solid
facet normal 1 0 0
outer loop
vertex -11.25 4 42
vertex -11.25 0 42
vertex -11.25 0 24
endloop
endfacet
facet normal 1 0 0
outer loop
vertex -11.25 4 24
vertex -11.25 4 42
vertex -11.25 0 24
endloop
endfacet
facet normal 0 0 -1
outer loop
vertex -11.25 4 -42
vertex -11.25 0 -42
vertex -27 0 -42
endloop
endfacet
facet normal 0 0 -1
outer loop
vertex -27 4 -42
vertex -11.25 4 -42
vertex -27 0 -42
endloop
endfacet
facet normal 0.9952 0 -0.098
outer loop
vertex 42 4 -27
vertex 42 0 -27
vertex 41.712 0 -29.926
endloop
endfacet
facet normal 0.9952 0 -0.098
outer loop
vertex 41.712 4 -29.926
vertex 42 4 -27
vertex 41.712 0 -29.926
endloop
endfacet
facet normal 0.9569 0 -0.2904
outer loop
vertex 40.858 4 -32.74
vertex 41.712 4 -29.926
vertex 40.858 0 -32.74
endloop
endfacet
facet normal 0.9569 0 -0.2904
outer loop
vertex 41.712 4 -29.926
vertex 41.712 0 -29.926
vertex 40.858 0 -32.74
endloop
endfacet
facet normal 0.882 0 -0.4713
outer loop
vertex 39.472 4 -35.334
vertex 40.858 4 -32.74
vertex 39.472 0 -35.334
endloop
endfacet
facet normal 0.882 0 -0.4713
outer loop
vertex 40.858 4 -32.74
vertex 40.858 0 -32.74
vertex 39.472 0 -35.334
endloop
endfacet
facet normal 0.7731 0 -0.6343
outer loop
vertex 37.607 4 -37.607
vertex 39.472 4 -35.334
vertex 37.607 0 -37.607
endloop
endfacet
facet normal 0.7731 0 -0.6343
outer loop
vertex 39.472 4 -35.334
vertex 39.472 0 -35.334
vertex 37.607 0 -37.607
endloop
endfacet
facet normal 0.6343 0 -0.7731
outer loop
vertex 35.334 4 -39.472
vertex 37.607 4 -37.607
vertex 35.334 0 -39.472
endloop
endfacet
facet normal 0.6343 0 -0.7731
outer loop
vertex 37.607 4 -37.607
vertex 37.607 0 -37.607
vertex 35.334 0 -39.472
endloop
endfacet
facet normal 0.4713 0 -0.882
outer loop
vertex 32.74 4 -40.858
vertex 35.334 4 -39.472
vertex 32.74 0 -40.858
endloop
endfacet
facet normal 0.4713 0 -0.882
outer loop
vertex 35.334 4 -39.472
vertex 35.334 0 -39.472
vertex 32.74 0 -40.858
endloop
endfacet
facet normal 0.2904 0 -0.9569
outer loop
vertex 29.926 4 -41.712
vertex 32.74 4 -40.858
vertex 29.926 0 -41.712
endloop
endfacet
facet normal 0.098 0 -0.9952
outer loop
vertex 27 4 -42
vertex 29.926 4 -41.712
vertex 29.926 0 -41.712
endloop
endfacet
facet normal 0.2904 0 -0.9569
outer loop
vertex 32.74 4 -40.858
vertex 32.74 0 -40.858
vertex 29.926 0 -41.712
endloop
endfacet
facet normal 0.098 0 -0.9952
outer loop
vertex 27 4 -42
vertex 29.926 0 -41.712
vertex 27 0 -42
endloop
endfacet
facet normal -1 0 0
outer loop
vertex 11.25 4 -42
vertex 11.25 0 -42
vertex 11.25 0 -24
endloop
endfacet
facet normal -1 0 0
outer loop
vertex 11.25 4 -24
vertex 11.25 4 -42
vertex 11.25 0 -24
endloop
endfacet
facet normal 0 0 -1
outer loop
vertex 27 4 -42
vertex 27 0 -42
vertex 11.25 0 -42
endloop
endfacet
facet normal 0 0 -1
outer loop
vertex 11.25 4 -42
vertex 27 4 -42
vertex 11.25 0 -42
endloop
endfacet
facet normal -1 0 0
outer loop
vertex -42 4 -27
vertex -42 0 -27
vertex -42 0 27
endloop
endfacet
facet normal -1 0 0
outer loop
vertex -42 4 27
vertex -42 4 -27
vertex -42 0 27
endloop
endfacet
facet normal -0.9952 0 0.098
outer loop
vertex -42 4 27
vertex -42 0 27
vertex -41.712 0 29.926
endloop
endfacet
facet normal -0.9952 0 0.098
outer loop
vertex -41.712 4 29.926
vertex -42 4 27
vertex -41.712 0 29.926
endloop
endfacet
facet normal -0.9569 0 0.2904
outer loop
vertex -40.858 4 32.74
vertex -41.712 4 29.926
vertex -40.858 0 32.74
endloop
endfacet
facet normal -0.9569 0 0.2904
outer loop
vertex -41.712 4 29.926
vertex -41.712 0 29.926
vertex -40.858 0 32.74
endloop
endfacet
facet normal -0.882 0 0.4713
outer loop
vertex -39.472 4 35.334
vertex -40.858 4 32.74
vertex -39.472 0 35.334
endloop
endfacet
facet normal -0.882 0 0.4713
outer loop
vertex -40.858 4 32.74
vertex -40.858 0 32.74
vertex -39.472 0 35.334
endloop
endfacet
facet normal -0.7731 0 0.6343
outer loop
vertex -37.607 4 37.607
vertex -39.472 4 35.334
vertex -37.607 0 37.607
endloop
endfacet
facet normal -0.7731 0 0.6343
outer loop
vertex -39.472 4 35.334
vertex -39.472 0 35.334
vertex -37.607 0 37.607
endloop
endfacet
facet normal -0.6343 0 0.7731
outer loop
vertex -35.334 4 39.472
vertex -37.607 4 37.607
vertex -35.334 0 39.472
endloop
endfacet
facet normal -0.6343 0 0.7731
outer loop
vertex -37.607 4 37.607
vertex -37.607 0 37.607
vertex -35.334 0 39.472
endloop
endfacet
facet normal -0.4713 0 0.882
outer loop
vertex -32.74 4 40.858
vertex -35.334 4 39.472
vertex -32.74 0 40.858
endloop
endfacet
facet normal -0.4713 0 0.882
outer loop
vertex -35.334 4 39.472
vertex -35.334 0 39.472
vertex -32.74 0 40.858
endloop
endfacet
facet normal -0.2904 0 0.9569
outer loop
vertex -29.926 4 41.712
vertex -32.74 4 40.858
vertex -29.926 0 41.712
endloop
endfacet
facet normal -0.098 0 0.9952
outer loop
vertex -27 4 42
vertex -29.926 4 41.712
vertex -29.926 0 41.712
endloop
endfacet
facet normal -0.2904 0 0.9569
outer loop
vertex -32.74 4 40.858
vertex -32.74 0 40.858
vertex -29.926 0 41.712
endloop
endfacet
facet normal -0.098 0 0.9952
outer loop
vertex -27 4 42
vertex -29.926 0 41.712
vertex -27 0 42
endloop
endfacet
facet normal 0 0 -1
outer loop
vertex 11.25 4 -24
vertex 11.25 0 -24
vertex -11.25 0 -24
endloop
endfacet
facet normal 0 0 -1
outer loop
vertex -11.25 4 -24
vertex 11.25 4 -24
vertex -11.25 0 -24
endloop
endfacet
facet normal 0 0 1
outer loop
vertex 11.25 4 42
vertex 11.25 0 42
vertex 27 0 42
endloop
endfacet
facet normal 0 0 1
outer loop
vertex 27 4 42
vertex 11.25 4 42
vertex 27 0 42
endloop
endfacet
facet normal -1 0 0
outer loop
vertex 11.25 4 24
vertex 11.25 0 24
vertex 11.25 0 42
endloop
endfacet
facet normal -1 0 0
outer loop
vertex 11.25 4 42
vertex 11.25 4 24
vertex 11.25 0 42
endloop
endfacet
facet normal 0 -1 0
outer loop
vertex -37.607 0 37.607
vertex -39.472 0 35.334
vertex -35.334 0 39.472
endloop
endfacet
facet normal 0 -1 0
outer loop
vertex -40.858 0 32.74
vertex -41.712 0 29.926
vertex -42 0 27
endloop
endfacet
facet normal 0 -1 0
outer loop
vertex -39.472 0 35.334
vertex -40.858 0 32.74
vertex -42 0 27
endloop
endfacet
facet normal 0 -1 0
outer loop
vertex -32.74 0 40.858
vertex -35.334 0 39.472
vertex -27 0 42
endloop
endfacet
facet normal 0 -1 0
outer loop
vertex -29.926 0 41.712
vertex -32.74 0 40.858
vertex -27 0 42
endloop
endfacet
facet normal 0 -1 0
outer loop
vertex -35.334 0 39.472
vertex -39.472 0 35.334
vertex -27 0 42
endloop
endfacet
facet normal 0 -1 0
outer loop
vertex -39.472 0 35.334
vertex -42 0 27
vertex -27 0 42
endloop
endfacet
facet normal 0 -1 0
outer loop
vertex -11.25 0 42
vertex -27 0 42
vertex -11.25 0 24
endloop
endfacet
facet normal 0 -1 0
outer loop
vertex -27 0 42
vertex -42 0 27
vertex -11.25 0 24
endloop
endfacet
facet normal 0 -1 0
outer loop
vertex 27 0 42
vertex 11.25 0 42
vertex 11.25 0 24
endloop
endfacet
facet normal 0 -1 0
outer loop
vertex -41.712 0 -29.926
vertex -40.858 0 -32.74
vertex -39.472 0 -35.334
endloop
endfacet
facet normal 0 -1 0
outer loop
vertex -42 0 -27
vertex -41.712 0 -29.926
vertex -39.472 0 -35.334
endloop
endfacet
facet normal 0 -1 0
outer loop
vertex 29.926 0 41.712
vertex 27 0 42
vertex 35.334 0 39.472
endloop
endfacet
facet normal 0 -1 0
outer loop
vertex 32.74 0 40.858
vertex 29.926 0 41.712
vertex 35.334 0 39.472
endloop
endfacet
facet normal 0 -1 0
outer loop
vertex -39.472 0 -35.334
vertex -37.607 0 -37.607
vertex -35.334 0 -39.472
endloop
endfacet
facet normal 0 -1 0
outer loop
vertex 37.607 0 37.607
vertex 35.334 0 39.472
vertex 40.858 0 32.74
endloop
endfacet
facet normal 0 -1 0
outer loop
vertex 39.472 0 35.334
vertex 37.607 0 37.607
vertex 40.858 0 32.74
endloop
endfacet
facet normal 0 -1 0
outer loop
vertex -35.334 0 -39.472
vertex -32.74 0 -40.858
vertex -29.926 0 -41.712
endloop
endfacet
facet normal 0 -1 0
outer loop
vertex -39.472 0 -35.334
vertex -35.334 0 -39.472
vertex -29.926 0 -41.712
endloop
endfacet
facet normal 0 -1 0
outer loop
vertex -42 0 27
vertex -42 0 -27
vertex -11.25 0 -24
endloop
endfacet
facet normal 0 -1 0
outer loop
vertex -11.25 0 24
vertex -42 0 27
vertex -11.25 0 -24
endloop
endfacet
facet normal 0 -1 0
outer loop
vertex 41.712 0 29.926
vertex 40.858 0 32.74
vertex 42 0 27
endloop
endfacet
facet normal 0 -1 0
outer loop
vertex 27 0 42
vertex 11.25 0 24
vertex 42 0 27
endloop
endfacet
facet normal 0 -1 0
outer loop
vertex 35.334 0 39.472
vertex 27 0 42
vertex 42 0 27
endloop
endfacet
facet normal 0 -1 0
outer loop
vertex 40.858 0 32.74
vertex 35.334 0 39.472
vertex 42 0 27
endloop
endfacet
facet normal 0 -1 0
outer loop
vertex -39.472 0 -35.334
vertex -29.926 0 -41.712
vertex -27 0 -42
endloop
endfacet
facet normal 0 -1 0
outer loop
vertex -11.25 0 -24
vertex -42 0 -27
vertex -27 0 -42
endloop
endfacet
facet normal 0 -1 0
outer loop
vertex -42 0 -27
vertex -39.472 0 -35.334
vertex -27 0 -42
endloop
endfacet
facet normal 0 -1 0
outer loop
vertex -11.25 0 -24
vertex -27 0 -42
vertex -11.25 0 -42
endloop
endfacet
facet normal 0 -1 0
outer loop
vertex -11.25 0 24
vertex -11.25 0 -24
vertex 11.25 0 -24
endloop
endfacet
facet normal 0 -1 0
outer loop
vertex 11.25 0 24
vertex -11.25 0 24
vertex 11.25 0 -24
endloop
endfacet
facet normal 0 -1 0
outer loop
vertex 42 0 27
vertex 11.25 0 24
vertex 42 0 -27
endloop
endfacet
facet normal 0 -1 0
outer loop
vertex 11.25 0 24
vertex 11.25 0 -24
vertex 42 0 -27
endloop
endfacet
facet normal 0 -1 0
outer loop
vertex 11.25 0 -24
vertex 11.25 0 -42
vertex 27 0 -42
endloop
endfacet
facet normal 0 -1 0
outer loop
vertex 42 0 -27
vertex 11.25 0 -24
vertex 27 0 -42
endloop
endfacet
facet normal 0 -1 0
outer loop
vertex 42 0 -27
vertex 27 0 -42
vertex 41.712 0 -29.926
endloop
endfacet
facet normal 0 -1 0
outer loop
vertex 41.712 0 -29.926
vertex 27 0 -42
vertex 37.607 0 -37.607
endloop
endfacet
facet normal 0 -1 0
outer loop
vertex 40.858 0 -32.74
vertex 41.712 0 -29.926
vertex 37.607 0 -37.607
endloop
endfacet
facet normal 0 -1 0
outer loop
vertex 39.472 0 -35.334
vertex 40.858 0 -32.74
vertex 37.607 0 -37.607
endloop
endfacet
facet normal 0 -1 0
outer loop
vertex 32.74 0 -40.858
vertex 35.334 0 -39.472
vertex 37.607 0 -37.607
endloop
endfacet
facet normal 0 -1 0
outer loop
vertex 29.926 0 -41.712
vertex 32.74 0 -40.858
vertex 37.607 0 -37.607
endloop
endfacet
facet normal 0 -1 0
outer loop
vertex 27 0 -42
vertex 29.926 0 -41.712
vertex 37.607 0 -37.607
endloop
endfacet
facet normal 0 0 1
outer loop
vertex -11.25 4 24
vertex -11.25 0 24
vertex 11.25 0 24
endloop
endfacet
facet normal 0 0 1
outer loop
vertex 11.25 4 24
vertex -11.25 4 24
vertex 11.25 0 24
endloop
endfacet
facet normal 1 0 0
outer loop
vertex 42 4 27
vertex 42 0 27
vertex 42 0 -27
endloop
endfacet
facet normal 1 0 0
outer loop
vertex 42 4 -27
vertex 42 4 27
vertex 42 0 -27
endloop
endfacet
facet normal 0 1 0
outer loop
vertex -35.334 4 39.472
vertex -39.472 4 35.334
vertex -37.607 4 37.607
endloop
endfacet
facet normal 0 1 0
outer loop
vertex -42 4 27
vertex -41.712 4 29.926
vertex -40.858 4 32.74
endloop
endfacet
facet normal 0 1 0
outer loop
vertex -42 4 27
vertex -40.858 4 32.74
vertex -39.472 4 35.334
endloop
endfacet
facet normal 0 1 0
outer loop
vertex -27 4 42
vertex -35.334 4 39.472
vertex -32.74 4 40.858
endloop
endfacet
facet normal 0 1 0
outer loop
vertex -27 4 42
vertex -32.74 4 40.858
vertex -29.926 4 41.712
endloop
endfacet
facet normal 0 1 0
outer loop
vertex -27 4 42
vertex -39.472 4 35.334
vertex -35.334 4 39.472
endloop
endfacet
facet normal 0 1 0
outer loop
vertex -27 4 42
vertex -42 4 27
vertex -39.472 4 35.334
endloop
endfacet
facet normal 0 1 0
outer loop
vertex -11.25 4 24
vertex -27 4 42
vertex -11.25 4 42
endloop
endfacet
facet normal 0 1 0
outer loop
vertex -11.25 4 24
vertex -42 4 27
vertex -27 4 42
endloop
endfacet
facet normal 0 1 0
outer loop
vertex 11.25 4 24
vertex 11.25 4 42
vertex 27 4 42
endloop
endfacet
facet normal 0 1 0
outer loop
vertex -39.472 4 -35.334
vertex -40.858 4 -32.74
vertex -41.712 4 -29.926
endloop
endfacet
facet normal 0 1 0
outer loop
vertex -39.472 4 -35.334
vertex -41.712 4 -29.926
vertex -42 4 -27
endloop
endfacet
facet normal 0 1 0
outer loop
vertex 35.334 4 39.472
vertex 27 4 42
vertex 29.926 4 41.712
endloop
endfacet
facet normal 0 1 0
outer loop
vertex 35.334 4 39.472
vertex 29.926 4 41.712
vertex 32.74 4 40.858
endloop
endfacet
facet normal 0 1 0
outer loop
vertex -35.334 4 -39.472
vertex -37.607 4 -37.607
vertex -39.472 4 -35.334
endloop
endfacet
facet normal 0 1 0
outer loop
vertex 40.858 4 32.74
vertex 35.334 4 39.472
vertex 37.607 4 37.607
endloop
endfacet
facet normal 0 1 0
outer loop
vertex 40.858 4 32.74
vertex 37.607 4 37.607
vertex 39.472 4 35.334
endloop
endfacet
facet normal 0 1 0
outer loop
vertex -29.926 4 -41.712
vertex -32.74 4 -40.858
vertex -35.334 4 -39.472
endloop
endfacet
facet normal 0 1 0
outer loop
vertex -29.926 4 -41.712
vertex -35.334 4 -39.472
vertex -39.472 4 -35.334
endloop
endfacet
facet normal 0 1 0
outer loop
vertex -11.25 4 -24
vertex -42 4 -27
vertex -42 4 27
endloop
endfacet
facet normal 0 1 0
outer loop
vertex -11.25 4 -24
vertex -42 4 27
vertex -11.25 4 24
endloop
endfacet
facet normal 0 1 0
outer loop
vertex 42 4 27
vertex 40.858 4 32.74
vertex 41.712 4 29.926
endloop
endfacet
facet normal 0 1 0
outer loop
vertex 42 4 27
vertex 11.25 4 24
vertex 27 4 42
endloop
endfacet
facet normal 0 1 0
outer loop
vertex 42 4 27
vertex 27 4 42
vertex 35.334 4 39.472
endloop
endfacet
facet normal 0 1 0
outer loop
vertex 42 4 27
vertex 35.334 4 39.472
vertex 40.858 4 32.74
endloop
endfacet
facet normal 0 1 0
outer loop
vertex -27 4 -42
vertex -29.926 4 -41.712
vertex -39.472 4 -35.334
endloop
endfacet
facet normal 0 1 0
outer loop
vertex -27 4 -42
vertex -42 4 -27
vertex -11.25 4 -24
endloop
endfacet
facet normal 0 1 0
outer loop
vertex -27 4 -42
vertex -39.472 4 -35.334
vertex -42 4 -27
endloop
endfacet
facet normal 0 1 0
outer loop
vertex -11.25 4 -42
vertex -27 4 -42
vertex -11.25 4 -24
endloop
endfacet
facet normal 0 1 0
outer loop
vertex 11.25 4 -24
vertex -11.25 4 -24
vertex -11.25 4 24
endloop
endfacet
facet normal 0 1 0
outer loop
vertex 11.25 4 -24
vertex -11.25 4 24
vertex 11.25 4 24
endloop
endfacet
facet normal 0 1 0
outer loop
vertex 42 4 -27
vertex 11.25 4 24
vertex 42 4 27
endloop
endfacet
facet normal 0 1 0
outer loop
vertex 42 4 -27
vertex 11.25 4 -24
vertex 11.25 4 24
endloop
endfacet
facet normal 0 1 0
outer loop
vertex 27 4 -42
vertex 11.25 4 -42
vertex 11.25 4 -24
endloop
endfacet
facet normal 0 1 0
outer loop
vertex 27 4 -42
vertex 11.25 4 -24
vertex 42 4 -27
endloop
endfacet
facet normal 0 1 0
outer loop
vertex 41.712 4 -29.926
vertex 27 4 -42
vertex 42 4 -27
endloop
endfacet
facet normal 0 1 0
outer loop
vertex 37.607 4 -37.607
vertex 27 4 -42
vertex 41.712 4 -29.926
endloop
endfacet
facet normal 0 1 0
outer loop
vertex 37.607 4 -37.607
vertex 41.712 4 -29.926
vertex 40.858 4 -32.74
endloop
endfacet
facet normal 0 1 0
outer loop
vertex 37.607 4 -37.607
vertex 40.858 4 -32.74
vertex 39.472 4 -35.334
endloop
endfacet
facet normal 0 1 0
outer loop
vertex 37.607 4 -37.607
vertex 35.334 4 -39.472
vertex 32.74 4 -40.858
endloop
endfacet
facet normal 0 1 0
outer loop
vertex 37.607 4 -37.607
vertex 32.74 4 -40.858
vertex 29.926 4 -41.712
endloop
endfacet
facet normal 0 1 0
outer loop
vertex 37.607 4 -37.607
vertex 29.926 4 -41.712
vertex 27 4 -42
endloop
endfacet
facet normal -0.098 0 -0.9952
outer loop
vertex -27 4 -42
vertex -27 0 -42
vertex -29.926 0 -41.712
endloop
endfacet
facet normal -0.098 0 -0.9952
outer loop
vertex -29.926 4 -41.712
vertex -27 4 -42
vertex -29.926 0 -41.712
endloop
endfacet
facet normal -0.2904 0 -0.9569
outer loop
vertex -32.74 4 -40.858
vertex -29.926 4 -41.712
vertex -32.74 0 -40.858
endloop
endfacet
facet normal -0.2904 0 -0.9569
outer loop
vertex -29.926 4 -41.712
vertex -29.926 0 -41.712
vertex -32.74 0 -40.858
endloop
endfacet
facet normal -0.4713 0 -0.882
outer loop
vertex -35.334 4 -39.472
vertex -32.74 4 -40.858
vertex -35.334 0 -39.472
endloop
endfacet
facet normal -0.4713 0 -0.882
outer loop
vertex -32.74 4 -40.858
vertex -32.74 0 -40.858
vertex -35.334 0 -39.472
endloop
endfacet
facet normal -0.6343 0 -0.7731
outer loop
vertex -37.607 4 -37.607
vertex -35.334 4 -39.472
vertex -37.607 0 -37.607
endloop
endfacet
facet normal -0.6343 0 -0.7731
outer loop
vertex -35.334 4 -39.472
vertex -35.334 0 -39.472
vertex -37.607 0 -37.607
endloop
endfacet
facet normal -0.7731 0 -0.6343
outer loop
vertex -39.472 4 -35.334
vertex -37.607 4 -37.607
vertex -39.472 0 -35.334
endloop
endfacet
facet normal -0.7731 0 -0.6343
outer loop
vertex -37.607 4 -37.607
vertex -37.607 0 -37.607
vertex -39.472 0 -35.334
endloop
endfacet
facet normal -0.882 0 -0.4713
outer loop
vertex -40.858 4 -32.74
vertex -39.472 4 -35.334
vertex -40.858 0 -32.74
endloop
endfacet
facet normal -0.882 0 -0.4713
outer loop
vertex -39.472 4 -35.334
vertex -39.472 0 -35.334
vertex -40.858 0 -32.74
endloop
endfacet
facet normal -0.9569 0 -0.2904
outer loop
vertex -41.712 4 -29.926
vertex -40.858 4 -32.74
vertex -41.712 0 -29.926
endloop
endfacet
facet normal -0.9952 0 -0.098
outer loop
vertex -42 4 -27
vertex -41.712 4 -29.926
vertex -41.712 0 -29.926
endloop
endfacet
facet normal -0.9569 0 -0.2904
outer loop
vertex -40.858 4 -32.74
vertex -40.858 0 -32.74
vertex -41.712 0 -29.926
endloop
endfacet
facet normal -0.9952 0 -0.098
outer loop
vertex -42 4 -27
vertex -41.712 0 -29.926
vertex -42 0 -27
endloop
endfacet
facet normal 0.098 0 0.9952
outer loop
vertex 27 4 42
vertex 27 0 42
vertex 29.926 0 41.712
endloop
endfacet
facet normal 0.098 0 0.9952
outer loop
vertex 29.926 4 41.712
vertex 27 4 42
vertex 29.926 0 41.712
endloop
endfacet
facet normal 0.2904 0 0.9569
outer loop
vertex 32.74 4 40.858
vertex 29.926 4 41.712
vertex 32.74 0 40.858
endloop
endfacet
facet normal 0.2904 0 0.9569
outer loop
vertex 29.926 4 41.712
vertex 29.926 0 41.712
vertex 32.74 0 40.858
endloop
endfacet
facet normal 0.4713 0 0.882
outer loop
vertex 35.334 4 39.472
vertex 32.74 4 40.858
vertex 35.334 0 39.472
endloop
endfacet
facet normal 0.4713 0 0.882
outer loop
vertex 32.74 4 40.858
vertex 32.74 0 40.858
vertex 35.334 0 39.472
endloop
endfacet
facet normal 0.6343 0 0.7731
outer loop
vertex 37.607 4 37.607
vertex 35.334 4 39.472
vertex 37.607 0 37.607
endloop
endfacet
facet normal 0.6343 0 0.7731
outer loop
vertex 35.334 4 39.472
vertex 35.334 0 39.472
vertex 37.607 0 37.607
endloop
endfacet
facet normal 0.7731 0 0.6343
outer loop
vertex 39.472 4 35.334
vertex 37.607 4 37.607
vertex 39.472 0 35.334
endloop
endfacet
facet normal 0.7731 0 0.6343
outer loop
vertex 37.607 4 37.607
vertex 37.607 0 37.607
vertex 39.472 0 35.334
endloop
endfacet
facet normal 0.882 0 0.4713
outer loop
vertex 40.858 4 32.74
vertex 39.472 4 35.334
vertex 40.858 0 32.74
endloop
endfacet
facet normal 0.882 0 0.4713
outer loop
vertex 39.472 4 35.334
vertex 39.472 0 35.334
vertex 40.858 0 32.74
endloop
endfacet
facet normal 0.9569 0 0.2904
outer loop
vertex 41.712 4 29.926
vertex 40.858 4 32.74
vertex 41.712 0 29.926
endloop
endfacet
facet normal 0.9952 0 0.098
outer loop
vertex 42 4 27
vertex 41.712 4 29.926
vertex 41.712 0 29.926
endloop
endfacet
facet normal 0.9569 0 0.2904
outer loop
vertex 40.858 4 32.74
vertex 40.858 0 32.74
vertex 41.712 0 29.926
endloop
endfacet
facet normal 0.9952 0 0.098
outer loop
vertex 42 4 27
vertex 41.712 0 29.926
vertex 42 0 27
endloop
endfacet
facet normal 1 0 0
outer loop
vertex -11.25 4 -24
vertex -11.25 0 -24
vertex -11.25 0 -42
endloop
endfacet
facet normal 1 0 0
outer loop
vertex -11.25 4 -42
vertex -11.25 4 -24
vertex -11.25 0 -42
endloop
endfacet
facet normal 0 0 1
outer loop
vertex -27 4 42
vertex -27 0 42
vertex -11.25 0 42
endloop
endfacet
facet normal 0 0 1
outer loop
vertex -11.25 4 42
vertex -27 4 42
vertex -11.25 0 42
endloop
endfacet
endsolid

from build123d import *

# Parameters (mm, degrees)
BOSS_EXTRUDE1_DEPTH = 4


with BuildPart() as part:
    # Layer1 → Boss-Extrude1 (new body)
    with BuildSketch(Plane(origin=(0, 0, 0), x_dir=(1, 0, 0), z_dir=(0, 1, 0))):
        with BuildLine():
            Line((27, 42), (11.25, 42))
            Line((11.25, 42), (11.25, 24))
            Line((11.25, 24), (-11.25, 24))
            Line((-11.25, 24), (-11.25, 42))
            Line((-11.25, 42), (-27, 42))
            ThreePointArc((-27, 42), (-37.606601718, 37.606601718), (-42, 27))
            Line((-42, 27), (-42, 21.5))
            Line((-42, 21.5), (-42, -21.5))
            Line((-42, -21.5), (-42, -27))
            ThreePointArc((-42, -27), (-37.606601718, -37.606601718), (-27, -42))
            Line((-27, -42), (-11.25, -42))
            Line((-11.25, -42), (-11.25, -24))
            Line((-11.25, -24), (11.25, -24))
            Line((11.25, -24), (11.25, -42))
            Line((11.25, -42), (27, -42))
            ThreePointArc((27, -42), (37.606601718, -37.606601718), (42, -27))
            Line((42, -27), (42, 27))
            ThreePointArc((42, 27), (37.606601718, 37.606601718), (27, 42))
        make_face()
    extrude(amount=BOSS_EXTRUDE1_DEPTH)


solid = part.part
